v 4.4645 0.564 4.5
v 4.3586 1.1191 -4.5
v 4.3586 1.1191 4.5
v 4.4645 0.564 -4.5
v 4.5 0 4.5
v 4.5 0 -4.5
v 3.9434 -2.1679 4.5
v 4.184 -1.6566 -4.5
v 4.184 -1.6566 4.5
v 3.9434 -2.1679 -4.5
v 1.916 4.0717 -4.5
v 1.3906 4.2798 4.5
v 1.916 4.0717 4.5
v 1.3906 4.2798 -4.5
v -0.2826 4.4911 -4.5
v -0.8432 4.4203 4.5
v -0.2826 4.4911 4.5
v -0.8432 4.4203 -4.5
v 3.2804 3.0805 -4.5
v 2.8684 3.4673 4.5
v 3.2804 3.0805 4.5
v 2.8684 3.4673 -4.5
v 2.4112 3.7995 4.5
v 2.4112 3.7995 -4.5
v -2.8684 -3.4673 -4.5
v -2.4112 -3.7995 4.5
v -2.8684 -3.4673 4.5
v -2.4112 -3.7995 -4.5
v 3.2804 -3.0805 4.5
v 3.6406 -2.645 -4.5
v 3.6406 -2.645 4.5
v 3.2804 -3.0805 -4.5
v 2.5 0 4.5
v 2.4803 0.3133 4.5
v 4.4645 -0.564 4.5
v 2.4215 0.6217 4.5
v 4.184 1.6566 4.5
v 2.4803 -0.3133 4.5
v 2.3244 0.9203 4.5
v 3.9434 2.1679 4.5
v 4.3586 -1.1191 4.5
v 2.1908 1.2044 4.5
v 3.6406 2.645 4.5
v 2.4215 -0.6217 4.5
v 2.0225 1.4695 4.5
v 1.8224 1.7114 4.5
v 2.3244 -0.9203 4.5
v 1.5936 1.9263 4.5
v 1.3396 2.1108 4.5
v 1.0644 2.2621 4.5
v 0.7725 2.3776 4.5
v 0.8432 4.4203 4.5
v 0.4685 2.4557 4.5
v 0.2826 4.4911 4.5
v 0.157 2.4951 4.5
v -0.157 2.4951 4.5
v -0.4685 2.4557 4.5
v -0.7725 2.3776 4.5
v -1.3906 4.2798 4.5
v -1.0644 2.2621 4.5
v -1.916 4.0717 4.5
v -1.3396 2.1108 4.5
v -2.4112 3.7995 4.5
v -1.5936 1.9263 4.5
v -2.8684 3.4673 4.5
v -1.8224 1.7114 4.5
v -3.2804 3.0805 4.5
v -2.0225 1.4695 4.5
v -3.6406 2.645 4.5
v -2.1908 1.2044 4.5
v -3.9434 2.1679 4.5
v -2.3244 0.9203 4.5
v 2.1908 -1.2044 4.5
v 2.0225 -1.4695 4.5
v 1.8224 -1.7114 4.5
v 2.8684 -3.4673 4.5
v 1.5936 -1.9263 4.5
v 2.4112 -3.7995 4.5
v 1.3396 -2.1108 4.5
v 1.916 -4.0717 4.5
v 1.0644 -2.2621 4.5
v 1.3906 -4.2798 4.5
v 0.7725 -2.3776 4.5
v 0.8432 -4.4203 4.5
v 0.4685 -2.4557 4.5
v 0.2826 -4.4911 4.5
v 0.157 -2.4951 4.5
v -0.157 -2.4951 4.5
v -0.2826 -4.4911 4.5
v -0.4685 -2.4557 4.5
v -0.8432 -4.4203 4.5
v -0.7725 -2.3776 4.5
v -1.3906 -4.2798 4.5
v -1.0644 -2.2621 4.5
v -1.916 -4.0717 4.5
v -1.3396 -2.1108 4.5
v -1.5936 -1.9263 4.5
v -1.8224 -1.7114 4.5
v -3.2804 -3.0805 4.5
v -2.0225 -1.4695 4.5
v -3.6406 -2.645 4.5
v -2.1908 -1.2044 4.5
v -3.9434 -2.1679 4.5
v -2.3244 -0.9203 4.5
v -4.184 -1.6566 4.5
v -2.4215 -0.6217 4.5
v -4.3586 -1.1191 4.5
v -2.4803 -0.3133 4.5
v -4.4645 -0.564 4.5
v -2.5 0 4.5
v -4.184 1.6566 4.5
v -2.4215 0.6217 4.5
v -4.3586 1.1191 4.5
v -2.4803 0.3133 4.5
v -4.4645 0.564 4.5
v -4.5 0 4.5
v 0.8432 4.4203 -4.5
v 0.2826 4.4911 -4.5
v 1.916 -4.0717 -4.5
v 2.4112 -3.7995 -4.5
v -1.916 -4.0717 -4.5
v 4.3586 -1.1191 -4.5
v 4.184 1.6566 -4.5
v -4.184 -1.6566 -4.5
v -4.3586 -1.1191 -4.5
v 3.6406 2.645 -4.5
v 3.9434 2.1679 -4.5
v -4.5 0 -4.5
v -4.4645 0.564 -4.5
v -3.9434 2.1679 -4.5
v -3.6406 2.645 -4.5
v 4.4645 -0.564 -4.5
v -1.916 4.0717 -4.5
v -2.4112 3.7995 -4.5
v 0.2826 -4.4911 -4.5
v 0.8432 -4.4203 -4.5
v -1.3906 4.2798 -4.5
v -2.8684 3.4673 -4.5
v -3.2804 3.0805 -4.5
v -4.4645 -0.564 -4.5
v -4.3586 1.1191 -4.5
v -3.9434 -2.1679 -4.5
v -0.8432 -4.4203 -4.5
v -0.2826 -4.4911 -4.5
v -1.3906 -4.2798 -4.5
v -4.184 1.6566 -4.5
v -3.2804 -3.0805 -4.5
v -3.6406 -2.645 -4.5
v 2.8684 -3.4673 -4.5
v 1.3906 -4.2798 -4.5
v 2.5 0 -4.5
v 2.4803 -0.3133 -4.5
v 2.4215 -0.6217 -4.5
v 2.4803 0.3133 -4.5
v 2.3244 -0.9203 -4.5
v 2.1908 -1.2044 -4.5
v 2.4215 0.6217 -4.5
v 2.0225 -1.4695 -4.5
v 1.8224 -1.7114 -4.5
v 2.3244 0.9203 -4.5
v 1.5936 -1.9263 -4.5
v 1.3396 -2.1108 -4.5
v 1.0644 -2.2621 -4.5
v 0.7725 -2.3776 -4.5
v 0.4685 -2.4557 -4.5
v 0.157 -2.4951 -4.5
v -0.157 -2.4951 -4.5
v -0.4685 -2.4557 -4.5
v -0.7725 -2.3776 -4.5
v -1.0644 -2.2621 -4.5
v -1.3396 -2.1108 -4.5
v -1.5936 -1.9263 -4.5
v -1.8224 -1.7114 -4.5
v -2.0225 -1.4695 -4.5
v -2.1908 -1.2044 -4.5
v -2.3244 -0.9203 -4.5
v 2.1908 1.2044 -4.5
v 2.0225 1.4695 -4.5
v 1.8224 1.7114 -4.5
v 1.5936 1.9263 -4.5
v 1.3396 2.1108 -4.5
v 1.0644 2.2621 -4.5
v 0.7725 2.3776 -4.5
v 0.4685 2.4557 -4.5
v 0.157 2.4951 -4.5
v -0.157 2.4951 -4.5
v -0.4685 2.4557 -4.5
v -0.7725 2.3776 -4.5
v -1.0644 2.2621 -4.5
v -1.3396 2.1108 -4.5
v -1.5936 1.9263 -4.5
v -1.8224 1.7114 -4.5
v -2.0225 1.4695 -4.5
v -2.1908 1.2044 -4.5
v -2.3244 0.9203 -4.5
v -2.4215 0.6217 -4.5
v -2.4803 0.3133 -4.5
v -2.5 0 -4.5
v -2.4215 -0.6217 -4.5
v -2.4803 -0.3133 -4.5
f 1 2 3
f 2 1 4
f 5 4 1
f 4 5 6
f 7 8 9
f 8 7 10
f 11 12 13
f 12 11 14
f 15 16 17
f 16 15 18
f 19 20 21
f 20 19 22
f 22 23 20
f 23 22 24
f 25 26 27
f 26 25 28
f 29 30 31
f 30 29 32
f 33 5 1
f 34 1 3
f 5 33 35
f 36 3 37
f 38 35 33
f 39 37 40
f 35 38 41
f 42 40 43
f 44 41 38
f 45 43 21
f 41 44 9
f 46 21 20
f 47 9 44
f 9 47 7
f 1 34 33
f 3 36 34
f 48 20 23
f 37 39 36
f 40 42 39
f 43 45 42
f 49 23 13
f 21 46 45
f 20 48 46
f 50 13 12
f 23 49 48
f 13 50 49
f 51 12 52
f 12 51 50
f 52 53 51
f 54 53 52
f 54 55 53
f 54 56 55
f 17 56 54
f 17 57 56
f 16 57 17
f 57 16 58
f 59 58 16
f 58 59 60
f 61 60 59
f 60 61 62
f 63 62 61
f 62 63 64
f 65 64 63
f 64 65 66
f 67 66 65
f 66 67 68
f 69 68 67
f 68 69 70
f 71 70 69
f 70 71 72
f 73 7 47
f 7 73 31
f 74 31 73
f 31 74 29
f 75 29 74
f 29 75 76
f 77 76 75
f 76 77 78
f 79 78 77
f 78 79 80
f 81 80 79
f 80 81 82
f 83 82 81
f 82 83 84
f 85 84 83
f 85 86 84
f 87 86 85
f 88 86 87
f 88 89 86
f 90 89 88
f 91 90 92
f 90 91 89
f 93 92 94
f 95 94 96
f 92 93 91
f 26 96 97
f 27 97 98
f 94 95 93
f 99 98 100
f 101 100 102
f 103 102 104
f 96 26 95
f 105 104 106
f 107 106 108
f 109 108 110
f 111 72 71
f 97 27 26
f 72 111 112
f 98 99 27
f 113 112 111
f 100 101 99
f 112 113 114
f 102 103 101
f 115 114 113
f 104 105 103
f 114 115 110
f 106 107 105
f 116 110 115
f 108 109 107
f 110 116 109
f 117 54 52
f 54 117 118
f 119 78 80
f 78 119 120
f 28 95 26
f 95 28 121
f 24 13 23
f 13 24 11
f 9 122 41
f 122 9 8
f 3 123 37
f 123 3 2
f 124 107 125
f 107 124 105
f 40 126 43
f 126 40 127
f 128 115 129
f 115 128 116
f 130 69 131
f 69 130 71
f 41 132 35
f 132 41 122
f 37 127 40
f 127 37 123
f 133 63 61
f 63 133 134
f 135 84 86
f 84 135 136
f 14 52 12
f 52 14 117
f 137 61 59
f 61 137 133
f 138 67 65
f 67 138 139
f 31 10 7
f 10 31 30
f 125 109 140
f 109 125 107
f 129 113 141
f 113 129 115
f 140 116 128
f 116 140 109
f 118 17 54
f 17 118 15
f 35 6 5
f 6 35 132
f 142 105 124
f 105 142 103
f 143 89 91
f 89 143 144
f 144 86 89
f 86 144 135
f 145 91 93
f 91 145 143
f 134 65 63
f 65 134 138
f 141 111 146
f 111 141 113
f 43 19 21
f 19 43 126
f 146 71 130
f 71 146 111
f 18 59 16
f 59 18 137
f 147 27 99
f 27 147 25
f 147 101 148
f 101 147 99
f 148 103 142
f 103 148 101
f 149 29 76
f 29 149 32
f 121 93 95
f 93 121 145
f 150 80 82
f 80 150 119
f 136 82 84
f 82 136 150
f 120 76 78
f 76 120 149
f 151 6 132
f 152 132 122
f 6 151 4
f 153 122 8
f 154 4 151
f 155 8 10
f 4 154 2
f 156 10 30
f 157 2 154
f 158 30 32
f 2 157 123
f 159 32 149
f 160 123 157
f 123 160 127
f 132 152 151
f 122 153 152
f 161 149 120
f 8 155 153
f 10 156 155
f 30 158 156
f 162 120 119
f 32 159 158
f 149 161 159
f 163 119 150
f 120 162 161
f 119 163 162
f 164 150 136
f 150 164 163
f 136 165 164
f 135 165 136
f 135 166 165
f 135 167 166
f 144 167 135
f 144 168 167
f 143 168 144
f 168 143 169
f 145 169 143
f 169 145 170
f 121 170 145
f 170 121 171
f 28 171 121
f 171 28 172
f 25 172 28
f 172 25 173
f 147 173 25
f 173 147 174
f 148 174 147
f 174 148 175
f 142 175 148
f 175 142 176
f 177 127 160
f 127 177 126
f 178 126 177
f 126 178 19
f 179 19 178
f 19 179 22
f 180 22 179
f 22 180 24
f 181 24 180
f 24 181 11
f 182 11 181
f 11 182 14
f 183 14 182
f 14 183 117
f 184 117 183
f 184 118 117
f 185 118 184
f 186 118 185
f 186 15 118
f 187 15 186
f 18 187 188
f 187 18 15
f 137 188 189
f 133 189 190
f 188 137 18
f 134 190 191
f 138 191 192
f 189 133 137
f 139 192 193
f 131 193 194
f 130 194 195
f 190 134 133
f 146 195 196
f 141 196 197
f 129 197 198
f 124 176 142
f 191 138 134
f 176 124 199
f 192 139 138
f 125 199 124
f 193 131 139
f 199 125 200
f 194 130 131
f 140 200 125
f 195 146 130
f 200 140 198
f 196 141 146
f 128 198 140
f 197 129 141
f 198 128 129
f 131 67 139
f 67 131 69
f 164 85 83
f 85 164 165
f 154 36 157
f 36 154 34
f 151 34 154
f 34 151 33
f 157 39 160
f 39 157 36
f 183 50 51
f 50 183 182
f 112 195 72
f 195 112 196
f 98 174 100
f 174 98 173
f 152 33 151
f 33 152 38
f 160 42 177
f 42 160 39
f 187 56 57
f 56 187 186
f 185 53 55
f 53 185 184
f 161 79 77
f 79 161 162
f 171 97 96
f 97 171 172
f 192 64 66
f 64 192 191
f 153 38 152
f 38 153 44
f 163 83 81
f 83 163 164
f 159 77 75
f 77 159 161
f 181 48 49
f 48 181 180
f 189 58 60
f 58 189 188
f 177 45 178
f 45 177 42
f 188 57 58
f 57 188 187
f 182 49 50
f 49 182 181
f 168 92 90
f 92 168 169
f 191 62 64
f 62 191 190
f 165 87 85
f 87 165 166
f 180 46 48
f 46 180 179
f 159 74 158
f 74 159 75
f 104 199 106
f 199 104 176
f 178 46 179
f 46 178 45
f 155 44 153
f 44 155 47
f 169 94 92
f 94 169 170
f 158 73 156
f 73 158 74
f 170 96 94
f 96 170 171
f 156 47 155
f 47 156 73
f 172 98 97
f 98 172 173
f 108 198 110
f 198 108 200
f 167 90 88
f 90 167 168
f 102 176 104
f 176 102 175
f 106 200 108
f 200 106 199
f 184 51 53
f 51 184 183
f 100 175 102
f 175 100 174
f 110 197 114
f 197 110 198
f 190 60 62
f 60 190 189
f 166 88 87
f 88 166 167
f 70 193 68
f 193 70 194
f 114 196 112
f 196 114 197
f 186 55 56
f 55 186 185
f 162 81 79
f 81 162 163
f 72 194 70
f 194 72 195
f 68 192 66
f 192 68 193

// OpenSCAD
$fn = 50;


difference() {
	union() {
		translate(v = [0, 0, -4.5000000000]) {
			cylinder(h = 9, r = 4.5000000000);
		}
	}
	union() {
		translate(v = [0, 0, -100.0000000000]) {
			cylinder(h = 200, r = 2.5000000000);
		}
	}
}
